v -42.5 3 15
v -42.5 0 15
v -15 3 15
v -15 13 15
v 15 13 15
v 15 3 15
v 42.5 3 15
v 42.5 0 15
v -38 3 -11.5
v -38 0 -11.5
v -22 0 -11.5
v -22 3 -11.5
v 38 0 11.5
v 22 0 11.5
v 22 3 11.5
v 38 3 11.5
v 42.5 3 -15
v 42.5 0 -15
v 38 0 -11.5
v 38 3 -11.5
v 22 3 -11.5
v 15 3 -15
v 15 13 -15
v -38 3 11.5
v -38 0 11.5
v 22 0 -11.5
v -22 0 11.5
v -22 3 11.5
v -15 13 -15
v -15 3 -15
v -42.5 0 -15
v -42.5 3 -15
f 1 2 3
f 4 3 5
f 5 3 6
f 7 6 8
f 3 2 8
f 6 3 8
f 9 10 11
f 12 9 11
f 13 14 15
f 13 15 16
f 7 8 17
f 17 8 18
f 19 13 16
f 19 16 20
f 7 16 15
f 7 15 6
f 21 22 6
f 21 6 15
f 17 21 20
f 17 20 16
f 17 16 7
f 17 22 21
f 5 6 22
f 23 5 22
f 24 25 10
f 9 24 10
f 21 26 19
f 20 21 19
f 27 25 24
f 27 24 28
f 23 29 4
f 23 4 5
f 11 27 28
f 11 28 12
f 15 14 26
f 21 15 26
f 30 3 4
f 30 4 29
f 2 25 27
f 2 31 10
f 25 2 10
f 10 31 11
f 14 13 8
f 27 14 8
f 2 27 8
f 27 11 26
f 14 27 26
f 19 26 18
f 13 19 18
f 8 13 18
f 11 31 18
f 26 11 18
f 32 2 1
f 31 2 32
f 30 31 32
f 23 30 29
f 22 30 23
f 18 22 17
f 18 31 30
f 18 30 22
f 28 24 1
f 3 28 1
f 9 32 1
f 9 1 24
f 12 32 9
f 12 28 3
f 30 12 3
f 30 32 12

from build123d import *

# Parameters (mm, degrees)
CROQUIS1_W              = 85
CROQUIS1_H              = 30
CROQUIS1_W_2            = 16
CROQUIS1_H_2            = 23
SALIENTE_EXTRUIR1_DEPTH = 3
CROQUIS3_W              = 30
CROQUIS3_H              = 30
SALIENTE_EXTRUIR2_DEPTH = 10


with BuildPart() as part:
    # Croquis1 → Saliente-Extruir1 (new body)
    with BuildSketch(Plane(origin=(0, 0, 0), x_dir=(1, 0, 0), z_dir=(0, 1, 0))):
        Rectangle(CROQUIS1_W, CROQUIS1_H)
        with Locations((30, 0)):
            Rectangle(CROQUIS1_W_2, CROQUIS1_H_2, mode=Mode.SUBTRACT)
        with Locations((-30, 0)):
            Rectangle(CROQUIS1_W_2, CROQUIS1_H_2, mode=Mode.SUBTRACT)
    extrude(amount=SALIENTE_EXTRUIR1_DEPTH)

    # Croquis3 → Saliente-Extruir2 (add)
    with BuildSketch(Plane(origin=(0, 3, 0), x_dir=(1, 0, 0), z_dir=(0, 1, 0))):
        Rectangle(CROQUIS3_W, CROQUIS3_H)
    extrude(amount=SALIENTE_EXTRUIR2_DEPTH)


solid = part.part
